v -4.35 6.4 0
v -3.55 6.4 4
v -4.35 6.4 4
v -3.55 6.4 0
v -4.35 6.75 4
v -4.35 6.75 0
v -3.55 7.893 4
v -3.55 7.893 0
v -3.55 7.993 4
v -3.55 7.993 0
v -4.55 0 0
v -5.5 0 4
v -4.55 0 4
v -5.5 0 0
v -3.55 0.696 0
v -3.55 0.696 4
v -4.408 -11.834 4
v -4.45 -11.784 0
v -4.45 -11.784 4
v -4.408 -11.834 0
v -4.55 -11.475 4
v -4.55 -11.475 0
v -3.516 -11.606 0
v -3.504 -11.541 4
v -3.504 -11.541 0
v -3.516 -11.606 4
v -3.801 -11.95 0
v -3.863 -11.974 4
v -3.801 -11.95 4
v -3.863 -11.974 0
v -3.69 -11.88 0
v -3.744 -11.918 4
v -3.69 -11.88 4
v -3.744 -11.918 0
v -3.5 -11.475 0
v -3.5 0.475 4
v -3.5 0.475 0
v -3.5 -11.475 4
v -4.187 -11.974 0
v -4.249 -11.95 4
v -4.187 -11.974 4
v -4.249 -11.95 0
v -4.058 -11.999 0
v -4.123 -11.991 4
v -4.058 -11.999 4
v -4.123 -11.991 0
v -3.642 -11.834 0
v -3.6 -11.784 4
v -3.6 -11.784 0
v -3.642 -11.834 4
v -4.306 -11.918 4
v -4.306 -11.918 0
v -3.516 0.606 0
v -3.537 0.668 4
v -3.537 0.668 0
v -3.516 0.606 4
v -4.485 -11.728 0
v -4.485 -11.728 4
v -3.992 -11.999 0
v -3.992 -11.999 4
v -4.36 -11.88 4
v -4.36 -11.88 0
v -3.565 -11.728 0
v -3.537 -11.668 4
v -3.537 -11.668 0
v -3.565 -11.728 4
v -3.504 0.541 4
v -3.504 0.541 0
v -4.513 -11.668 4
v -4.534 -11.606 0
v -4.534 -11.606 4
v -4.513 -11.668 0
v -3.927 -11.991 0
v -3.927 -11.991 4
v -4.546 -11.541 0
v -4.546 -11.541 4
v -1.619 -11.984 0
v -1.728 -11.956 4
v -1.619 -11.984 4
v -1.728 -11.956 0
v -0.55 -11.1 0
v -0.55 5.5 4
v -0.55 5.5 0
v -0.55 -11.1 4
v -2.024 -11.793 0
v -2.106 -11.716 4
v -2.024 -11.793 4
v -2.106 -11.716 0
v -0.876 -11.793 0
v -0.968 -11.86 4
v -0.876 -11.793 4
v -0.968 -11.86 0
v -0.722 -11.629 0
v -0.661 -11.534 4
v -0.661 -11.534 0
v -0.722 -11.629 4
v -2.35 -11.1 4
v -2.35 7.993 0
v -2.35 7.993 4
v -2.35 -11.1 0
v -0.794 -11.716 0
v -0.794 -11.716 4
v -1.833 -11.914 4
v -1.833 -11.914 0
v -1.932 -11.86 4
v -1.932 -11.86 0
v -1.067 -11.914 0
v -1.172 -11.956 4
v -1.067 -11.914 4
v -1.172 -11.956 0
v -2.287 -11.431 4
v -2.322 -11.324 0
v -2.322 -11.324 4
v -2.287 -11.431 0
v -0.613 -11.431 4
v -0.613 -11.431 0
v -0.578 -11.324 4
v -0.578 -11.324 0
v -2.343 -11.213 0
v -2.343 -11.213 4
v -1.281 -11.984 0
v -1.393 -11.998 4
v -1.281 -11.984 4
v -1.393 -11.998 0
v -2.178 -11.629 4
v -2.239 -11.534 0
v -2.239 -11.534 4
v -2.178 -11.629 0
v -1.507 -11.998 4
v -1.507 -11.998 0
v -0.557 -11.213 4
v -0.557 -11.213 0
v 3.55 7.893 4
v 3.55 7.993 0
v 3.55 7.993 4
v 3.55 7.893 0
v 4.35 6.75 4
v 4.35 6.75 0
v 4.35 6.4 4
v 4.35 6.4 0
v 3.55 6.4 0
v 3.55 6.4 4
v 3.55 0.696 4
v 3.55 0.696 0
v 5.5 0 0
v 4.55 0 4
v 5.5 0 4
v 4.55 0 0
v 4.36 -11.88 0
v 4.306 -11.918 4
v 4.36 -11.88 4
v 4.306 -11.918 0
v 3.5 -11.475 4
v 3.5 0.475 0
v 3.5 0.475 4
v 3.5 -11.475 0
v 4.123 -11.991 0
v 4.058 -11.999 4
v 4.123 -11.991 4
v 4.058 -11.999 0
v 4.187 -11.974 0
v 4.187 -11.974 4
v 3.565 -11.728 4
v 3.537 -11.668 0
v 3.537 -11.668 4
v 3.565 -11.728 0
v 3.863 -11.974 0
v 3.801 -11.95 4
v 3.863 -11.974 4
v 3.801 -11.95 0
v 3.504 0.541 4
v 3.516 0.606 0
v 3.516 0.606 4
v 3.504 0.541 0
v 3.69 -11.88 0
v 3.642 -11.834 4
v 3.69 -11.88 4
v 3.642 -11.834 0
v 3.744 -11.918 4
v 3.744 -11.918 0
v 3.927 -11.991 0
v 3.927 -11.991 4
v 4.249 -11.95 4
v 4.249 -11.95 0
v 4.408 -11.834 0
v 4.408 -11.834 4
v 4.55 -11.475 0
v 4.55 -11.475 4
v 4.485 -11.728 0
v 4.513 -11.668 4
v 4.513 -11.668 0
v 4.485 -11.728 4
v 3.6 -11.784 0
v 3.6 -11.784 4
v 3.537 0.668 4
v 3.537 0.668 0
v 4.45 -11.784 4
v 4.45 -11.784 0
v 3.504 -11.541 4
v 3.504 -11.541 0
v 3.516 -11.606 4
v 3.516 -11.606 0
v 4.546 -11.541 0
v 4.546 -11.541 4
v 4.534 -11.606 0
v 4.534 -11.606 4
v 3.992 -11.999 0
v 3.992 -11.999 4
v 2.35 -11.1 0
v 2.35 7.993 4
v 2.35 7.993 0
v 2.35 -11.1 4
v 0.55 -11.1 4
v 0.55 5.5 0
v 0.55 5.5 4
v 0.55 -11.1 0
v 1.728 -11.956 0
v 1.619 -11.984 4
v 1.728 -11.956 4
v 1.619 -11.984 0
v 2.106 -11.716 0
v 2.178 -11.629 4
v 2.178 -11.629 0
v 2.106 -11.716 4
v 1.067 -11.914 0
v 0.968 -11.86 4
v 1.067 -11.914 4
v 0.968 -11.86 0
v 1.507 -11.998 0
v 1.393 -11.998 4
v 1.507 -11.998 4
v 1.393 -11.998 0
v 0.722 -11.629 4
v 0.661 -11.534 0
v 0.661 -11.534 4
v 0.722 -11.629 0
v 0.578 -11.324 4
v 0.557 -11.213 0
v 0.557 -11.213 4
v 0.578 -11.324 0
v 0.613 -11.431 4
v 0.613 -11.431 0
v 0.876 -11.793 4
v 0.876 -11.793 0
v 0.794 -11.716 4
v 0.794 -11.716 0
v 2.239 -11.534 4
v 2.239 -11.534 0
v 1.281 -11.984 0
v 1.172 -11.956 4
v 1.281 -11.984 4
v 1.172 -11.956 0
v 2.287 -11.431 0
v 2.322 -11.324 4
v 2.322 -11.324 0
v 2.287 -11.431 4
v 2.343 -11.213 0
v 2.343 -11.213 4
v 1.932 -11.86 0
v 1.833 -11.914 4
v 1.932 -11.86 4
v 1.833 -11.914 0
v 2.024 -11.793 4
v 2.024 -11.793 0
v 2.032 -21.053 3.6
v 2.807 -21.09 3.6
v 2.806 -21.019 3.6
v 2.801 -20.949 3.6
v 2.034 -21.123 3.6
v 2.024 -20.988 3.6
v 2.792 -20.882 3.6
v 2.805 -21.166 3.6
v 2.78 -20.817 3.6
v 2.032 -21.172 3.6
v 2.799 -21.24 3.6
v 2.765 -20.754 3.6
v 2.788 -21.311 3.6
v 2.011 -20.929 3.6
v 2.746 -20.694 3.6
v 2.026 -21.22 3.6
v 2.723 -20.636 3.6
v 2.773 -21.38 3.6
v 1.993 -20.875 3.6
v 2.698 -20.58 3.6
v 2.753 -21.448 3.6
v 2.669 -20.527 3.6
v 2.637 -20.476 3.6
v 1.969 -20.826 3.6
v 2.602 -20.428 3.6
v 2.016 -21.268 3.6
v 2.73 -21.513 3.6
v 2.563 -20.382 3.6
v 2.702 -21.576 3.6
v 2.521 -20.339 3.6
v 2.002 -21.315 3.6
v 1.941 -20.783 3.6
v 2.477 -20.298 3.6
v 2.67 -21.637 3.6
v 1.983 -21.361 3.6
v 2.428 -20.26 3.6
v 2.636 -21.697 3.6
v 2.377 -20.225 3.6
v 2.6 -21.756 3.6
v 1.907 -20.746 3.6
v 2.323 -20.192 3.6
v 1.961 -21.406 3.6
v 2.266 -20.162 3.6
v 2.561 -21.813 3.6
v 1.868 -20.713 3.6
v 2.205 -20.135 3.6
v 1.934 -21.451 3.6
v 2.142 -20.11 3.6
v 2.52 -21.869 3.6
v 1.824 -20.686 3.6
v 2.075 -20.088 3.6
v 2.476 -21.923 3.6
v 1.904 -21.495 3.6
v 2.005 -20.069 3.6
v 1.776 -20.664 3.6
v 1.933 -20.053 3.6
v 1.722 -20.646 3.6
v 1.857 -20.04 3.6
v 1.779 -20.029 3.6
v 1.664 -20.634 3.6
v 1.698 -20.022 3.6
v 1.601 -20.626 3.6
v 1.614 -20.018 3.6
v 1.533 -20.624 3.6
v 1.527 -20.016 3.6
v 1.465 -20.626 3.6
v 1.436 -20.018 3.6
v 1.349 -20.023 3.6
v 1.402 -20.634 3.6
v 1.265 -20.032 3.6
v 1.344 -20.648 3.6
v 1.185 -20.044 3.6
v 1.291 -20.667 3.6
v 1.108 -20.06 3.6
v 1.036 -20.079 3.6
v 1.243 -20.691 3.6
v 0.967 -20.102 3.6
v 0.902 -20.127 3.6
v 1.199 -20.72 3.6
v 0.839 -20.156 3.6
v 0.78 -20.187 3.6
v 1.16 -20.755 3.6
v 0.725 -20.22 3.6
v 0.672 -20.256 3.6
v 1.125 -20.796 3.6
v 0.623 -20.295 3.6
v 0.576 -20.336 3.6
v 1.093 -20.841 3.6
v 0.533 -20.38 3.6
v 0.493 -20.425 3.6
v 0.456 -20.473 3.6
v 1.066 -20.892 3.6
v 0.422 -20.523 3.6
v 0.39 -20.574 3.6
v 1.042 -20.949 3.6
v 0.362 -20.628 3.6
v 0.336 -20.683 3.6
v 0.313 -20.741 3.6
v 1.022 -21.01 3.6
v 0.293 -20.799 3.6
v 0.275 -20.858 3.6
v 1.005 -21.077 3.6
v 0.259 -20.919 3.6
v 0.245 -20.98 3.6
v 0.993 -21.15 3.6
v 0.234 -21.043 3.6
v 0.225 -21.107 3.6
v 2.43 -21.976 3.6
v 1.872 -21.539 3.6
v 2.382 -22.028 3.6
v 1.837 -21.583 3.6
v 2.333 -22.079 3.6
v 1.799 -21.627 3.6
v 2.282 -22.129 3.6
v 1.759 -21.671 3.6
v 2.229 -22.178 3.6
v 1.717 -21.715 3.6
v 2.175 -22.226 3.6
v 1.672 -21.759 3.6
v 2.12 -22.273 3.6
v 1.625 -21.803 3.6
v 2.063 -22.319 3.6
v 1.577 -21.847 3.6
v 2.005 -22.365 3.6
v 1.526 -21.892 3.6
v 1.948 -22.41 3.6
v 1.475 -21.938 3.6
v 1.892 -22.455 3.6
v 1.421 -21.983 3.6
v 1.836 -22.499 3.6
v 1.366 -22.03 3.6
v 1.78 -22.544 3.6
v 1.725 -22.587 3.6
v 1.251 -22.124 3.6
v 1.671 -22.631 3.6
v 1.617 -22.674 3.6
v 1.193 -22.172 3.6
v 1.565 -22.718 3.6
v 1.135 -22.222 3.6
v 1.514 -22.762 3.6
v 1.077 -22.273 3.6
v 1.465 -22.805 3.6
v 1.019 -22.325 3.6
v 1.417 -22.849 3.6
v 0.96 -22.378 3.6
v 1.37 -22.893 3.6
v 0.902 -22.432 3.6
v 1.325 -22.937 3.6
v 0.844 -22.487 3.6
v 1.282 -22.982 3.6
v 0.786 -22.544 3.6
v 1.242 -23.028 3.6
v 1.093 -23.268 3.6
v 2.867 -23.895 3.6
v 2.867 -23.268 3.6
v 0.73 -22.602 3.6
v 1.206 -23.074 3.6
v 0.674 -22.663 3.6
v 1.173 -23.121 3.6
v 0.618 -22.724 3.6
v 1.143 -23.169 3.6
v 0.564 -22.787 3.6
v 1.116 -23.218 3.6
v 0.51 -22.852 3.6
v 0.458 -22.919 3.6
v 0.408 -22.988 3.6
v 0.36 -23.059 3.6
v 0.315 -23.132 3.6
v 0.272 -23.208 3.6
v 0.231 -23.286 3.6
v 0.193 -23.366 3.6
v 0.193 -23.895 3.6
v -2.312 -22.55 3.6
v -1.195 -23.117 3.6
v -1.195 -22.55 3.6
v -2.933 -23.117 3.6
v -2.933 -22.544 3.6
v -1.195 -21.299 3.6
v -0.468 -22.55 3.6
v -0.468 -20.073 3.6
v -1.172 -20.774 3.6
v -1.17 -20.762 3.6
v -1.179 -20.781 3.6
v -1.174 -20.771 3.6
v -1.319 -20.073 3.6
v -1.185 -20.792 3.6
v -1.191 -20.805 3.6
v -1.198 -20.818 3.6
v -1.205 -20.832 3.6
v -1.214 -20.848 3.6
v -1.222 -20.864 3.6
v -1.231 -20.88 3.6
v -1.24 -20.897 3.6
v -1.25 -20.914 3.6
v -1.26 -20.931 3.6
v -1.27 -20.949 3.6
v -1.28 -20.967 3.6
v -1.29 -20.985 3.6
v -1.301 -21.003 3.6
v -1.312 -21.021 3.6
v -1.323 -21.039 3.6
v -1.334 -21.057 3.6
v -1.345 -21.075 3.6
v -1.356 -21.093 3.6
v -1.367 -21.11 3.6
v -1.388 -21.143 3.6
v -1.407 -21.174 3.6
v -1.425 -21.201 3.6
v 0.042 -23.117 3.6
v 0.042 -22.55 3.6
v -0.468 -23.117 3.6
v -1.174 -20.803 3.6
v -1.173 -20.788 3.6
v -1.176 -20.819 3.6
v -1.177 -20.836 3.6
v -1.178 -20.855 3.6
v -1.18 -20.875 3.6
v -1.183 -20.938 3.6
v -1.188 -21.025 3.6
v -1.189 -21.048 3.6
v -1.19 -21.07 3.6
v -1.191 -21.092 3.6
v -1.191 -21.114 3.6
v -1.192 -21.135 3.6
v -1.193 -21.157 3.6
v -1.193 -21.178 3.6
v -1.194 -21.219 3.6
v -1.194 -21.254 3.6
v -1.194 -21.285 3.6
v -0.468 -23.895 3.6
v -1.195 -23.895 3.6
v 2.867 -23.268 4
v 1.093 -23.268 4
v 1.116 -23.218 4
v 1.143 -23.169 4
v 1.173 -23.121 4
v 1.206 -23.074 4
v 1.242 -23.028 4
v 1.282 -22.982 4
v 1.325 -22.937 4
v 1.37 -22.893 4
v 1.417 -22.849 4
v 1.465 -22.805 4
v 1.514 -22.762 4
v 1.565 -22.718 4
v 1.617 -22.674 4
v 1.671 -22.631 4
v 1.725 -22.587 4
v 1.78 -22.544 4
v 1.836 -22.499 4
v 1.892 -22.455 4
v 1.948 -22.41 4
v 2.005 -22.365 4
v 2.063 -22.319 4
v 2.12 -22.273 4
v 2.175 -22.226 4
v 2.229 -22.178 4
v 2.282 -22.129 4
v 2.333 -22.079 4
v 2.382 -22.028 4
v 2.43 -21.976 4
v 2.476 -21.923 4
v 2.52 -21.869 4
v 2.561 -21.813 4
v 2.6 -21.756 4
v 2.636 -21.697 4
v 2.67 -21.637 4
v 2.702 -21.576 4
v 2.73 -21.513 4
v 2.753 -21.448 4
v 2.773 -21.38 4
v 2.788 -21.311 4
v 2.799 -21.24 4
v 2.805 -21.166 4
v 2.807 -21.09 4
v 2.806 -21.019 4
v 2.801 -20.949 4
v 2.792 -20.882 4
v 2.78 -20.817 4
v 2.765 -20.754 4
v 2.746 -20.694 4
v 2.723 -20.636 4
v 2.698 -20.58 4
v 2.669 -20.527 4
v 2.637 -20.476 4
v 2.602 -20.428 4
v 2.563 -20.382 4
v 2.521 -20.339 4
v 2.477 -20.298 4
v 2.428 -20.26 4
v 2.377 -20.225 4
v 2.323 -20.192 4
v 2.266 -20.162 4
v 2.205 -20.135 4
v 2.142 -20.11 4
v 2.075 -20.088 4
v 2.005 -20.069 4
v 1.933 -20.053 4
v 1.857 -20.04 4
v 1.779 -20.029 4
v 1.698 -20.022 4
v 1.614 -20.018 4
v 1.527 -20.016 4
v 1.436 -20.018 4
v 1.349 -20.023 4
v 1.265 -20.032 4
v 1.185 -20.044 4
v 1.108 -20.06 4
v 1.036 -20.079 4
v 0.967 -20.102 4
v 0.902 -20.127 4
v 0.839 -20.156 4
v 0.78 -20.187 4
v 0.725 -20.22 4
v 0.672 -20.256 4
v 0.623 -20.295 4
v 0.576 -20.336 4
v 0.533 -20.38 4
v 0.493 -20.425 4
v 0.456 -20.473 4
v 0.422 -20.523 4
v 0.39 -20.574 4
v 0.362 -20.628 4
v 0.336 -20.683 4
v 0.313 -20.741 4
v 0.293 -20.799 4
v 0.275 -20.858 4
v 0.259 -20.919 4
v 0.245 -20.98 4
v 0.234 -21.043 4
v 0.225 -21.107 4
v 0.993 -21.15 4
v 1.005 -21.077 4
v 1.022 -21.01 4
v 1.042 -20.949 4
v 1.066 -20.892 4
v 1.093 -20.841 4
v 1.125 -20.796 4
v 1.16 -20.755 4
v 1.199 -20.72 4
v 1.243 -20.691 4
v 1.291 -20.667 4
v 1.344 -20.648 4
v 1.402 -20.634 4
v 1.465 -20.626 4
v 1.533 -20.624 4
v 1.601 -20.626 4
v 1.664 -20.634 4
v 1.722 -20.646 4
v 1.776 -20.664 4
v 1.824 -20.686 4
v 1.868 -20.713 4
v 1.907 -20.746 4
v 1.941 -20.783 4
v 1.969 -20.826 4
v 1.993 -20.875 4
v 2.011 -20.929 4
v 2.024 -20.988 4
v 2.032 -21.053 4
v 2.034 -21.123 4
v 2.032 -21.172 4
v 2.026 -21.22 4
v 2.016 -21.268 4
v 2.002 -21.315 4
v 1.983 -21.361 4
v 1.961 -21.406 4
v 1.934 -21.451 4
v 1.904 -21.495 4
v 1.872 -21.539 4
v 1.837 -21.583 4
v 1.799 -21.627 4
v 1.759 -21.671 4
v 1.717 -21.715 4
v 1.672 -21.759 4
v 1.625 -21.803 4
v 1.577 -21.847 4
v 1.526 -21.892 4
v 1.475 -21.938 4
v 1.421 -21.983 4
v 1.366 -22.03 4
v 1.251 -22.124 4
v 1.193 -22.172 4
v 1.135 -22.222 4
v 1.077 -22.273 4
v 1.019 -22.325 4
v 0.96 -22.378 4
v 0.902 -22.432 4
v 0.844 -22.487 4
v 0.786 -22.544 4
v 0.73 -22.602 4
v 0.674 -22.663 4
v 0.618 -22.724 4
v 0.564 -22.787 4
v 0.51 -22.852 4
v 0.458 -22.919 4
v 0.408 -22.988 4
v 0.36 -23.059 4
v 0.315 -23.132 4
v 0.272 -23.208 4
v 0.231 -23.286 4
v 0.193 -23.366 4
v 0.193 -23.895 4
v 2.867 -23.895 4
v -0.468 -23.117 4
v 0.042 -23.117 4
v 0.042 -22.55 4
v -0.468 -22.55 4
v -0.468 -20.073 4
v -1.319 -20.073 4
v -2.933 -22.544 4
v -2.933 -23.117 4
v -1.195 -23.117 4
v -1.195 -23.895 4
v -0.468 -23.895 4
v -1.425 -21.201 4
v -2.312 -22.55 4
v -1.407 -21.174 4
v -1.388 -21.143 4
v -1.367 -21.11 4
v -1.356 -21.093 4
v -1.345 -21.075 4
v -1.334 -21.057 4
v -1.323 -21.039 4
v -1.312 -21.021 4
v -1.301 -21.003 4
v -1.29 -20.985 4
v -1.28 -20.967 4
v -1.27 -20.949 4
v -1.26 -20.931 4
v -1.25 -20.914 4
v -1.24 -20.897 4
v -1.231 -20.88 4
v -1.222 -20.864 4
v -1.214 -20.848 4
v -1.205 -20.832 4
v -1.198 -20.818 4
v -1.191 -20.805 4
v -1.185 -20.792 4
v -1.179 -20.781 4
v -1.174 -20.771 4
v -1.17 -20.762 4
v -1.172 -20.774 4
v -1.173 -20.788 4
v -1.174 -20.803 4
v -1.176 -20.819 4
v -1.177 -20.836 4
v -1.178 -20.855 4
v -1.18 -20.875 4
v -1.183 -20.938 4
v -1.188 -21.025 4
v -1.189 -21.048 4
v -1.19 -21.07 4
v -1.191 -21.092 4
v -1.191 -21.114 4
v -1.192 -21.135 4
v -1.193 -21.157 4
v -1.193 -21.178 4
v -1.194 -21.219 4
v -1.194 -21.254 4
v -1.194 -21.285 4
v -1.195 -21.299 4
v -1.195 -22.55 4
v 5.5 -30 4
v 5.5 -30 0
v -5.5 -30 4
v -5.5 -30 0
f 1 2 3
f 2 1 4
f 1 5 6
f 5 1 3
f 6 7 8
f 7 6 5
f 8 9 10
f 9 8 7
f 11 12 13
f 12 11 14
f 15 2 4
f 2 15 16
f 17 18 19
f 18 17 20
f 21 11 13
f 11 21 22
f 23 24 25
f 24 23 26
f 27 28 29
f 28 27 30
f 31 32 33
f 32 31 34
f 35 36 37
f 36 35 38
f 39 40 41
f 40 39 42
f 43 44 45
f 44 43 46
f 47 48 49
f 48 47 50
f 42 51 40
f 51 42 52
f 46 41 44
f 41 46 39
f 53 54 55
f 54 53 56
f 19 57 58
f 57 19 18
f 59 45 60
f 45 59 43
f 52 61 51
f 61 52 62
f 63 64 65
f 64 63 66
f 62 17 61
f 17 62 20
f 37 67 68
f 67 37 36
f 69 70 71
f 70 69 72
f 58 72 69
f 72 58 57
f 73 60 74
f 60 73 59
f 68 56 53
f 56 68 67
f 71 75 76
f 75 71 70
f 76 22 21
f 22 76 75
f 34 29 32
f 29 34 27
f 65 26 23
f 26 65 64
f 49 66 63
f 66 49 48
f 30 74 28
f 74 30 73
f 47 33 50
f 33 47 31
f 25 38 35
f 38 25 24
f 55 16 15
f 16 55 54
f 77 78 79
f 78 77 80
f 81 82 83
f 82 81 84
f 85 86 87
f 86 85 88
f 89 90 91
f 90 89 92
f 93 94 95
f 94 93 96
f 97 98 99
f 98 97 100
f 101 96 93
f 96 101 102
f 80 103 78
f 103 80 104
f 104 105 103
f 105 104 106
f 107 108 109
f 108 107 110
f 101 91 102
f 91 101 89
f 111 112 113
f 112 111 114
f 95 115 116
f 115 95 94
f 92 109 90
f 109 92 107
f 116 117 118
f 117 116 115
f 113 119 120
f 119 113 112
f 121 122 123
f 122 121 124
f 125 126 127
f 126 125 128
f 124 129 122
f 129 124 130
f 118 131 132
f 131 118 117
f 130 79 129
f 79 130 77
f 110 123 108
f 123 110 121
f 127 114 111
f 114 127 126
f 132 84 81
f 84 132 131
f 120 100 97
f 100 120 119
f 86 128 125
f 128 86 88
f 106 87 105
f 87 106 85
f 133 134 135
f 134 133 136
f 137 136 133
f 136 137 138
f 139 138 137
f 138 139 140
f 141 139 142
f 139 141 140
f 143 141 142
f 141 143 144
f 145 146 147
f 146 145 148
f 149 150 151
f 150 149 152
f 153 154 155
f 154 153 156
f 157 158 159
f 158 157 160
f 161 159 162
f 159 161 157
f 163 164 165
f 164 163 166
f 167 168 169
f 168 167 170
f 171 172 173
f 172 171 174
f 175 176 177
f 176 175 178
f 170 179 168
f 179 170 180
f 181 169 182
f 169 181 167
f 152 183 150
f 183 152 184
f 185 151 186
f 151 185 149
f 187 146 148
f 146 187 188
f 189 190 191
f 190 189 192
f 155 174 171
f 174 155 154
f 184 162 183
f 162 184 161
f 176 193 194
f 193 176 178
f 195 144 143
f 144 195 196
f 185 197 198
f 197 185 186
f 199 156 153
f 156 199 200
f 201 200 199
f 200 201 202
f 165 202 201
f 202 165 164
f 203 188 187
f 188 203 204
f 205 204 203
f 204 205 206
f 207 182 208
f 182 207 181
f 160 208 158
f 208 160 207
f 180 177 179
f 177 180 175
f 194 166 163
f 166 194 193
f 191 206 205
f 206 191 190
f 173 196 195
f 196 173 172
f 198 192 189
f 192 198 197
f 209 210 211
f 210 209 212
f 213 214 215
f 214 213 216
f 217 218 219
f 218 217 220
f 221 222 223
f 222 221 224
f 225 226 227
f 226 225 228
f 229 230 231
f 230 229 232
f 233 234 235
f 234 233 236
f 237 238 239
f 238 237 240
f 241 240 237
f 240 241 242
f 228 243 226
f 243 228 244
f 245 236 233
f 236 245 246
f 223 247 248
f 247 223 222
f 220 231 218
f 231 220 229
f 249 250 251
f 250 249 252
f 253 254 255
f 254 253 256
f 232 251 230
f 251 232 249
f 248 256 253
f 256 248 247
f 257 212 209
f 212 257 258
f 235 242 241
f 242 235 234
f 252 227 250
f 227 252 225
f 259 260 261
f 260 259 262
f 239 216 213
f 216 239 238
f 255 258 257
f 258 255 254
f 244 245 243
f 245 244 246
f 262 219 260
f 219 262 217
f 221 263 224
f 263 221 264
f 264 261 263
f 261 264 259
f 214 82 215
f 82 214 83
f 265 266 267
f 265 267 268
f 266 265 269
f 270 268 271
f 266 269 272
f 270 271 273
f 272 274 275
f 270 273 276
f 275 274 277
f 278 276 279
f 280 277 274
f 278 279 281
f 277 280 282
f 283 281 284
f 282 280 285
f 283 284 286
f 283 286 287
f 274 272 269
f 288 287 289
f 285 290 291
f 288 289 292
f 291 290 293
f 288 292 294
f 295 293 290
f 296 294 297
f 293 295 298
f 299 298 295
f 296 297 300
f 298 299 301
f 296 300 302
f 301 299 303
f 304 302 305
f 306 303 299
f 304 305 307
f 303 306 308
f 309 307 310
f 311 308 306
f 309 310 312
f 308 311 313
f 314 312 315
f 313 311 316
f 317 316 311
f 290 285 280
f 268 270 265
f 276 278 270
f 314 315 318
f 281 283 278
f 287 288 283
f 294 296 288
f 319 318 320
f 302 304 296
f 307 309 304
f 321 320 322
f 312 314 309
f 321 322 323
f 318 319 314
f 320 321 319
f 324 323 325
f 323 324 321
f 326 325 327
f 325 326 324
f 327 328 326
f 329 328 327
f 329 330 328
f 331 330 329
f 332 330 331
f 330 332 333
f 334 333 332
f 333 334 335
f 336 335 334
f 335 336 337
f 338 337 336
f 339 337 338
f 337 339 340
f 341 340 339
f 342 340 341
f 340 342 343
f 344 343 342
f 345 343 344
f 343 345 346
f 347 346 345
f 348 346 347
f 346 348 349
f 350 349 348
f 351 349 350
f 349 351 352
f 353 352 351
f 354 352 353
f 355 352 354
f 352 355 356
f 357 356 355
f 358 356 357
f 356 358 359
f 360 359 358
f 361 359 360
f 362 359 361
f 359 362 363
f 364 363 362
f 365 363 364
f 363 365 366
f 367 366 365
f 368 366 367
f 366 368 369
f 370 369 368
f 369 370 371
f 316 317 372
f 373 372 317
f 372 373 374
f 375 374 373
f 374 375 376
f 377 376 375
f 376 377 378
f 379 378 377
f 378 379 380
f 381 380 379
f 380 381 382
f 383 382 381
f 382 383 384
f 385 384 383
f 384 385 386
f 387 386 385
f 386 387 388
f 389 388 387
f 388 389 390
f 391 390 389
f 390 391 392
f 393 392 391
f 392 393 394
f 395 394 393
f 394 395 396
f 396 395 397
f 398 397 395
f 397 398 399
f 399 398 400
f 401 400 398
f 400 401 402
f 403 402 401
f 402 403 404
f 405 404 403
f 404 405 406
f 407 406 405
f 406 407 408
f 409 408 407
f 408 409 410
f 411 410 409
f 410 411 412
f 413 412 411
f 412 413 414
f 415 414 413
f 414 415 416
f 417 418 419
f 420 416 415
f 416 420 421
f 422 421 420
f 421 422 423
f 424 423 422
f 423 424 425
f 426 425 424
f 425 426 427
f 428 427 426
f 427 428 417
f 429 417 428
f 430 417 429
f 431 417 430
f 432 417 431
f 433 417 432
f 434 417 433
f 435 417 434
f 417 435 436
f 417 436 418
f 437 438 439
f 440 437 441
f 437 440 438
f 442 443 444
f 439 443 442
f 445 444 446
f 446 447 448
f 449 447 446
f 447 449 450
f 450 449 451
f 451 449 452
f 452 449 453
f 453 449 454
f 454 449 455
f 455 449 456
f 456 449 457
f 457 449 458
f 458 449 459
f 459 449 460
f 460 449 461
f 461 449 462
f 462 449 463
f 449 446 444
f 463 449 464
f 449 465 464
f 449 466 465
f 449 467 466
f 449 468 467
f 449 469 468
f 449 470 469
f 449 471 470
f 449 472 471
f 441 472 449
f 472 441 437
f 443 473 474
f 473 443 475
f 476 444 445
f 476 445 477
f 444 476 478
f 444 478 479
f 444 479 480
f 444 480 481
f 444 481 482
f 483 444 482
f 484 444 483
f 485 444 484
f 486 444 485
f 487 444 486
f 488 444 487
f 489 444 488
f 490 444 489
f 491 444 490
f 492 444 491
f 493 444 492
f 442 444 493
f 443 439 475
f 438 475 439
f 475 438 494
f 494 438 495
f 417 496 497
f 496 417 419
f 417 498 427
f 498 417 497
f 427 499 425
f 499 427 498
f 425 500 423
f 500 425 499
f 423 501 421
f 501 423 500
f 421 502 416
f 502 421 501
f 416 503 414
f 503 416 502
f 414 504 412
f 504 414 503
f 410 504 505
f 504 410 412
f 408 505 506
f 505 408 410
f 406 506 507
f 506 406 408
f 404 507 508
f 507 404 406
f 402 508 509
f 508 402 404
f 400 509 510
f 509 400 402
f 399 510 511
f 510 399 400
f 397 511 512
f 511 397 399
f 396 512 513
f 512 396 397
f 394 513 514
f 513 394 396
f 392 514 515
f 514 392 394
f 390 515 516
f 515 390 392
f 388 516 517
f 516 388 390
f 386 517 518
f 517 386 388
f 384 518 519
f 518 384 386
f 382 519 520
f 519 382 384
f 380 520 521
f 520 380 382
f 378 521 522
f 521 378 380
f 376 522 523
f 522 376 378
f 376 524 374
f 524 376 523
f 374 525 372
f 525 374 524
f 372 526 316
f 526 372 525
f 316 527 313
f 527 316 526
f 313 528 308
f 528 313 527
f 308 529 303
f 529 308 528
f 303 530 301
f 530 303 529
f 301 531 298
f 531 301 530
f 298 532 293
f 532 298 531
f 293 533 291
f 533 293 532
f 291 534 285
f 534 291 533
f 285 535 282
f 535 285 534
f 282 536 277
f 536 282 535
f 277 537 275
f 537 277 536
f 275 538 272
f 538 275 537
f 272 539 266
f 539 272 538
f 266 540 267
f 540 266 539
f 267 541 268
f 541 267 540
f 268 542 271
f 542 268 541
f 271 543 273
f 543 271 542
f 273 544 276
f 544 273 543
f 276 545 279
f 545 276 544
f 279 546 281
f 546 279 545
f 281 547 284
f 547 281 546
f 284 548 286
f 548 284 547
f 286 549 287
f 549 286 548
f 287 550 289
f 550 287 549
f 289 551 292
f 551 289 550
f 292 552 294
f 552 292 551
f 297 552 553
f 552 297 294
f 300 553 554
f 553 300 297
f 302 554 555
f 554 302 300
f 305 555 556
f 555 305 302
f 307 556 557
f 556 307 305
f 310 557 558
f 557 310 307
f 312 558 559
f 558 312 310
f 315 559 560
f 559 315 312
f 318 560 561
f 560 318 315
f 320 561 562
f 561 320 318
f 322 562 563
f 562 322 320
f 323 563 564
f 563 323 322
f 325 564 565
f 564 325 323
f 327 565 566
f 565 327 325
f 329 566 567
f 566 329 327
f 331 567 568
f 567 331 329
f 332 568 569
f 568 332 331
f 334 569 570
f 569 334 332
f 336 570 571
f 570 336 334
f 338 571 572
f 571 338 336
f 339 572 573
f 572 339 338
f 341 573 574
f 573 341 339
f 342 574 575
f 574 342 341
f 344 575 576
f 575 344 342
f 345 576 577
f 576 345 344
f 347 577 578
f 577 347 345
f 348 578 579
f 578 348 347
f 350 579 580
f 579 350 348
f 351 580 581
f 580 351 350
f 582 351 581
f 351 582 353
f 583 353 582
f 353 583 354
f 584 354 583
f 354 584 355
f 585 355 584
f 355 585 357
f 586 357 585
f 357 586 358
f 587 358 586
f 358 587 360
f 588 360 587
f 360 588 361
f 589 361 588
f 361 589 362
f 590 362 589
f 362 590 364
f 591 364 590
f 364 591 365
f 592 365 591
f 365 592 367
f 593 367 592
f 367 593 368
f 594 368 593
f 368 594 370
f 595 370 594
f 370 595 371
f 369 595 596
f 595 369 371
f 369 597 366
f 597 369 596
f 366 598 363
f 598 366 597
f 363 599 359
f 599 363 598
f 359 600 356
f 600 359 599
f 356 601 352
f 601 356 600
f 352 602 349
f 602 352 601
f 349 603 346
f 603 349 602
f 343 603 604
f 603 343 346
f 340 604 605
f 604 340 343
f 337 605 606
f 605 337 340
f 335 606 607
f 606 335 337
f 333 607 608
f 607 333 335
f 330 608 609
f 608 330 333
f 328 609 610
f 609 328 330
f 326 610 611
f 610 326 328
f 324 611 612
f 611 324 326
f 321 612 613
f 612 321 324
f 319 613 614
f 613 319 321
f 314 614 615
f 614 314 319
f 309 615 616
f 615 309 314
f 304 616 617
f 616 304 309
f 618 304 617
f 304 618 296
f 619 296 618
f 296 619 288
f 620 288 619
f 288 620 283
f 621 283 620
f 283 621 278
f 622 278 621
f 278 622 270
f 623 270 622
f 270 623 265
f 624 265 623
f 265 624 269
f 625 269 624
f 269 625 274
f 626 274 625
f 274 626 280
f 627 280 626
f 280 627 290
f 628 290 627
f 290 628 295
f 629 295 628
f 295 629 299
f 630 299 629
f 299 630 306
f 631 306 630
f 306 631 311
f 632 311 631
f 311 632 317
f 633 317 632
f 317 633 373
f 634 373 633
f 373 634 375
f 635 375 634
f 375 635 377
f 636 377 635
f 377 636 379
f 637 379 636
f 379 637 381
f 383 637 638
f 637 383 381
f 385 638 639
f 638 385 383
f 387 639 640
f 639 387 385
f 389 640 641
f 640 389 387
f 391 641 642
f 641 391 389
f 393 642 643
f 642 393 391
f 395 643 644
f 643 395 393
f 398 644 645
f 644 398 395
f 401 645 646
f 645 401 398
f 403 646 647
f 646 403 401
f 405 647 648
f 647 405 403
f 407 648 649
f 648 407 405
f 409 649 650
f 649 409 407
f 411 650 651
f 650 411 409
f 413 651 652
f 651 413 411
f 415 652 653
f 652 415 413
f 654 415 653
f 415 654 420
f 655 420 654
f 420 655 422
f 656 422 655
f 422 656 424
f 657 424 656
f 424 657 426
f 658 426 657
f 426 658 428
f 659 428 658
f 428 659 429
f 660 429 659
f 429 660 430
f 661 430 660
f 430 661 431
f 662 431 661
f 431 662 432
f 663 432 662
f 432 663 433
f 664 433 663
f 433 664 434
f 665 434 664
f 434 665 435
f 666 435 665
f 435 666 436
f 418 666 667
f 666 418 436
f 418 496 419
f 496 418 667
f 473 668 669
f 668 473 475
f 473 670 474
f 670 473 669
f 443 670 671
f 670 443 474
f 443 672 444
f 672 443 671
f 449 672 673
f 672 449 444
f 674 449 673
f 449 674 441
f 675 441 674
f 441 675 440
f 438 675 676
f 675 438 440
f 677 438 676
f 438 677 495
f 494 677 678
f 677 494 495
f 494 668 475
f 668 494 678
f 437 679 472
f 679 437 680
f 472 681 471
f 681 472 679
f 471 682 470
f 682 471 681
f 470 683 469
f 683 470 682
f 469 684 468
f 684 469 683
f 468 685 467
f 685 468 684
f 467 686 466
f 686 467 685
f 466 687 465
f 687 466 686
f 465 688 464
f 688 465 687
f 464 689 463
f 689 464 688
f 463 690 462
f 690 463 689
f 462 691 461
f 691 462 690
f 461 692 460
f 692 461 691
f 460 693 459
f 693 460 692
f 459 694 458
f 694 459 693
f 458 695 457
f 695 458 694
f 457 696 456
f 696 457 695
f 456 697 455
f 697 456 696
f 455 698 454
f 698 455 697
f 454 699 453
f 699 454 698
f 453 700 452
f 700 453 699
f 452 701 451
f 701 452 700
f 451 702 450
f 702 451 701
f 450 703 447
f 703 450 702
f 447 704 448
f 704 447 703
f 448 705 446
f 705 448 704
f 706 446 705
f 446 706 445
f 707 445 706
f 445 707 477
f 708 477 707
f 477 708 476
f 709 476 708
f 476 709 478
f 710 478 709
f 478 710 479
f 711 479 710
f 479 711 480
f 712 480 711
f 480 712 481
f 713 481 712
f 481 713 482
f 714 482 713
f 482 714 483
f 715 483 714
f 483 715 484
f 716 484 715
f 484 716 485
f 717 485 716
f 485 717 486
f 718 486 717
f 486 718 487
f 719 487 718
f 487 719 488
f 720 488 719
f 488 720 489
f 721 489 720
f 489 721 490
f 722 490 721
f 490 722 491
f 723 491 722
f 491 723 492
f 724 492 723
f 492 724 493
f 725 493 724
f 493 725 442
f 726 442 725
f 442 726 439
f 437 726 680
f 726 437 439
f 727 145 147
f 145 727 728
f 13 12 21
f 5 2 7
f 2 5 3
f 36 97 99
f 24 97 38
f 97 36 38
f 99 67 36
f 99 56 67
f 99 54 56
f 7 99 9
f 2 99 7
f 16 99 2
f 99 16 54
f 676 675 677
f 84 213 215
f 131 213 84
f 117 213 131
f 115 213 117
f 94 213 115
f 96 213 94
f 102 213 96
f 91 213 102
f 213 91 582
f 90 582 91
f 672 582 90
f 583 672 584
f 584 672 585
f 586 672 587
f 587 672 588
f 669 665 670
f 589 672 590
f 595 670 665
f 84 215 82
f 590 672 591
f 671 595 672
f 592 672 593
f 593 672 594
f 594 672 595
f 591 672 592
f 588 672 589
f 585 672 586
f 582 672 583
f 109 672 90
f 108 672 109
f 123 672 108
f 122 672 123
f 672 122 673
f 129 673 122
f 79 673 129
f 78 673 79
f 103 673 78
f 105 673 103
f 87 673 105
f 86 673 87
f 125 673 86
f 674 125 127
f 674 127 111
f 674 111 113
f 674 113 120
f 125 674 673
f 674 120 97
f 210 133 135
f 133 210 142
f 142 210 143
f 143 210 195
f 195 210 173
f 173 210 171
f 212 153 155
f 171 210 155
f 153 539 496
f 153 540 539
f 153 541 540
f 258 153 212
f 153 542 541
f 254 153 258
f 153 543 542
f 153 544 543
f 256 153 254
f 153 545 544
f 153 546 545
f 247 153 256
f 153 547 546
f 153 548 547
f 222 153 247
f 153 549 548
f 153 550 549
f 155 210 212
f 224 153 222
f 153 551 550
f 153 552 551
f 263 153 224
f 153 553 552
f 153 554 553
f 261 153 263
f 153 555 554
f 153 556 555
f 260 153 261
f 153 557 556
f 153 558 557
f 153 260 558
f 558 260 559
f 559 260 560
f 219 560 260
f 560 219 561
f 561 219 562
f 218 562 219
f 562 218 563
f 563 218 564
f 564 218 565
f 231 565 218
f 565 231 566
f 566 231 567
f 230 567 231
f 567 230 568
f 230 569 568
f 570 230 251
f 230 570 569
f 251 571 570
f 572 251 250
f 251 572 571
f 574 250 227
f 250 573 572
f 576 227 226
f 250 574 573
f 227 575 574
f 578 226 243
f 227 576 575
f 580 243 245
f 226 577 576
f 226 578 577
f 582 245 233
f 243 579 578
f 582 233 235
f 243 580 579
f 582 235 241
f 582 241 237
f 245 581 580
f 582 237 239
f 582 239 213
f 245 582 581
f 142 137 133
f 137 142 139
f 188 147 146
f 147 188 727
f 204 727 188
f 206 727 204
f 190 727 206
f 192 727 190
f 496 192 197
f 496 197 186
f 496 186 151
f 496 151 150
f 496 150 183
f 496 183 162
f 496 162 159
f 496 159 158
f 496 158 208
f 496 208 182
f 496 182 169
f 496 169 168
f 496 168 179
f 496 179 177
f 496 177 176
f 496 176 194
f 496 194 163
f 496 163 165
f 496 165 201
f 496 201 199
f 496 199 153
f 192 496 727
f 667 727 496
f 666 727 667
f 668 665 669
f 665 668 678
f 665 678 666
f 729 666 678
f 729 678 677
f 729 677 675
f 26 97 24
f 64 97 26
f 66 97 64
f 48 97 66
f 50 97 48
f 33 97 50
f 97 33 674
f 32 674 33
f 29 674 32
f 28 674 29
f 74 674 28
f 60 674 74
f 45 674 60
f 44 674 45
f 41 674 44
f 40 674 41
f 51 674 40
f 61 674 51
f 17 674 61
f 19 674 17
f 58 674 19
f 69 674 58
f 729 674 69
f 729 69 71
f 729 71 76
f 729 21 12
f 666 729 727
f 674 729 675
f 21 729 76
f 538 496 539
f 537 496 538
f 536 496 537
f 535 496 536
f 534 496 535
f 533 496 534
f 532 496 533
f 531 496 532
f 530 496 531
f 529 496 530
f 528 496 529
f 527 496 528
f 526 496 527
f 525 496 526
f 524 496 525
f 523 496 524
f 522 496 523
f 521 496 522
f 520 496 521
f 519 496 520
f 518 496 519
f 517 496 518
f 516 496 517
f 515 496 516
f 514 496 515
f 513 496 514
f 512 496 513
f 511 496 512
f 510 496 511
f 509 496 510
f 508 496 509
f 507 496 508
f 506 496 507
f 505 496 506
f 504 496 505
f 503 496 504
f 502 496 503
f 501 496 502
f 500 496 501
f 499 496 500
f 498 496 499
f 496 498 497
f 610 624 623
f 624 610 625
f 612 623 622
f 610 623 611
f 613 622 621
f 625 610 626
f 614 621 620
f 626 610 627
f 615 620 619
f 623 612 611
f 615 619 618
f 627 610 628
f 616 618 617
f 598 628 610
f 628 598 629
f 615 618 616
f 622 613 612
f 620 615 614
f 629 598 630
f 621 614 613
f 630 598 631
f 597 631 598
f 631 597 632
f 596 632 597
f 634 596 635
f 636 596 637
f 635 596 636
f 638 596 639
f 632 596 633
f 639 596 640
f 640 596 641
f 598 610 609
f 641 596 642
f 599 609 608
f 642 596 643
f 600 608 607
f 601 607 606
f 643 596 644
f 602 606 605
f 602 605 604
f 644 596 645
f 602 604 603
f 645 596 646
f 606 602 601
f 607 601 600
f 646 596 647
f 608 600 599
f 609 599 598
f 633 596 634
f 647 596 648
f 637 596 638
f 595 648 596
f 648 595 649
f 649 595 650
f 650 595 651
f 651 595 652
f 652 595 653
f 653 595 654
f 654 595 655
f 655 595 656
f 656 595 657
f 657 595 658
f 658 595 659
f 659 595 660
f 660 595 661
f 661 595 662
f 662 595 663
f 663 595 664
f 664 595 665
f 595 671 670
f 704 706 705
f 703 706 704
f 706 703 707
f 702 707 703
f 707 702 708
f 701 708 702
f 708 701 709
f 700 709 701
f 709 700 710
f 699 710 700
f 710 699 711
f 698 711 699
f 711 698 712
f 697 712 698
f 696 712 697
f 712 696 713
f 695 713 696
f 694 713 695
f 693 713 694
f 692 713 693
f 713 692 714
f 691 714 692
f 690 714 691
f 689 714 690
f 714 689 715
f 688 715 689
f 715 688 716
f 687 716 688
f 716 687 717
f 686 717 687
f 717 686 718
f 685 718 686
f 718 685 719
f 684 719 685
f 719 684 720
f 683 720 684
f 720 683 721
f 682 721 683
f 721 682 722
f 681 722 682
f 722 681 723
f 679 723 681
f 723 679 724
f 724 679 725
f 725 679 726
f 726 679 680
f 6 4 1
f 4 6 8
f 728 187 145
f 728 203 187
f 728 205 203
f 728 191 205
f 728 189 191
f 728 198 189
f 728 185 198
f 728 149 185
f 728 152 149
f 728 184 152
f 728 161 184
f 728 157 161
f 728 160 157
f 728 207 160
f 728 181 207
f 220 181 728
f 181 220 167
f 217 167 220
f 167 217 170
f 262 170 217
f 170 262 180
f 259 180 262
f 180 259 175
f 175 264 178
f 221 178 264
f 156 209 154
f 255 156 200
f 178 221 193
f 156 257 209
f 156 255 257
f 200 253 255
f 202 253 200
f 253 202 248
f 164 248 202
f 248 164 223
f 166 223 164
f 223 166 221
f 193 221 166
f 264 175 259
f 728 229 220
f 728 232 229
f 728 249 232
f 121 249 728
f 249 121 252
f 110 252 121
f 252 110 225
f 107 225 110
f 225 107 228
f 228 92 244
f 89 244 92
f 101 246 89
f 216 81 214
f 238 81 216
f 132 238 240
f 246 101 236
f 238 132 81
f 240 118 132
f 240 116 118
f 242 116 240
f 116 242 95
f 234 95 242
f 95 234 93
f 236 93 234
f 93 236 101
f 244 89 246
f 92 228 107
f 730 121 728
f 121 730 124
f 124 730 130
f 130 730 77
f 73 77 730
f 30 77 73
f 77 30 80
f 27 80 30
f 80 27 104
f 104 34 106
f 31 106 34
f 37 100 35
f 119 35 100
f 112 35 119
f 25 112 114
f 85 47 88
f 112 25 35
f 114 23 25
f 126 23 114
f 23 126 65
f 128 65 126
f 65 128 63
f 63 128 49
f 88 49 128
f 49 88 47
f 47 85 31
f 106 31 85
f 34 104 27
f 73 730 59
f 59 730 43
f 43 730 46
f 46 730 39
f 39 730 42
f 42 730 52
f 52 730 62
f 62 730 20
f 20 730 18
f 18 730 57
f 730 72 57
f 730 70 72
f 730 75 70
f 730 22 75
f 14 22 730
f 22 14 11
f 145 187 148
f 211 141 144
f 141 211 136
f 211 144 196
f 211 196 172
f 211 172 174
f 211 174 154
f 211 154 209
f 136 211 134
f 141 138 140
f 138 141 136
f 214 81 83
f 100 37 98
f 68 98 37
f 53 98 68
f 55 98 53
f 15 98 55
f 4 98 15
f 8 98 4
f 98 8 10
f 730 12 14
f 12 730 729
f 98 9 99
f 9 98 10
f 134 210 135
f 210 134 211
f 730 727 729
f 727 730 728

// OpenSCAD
$fn = 50;

difference() {
	union() {
		translate(v = [0, 0, 0]) {
			rotate(a = [0, 0, 0]) {
				difference() {
					union() {
						translate(v = [-5.5, -30.0, 0]) {
							cube(size = [11.0, 37.99251840539369, 4.0]);
						}
					}
					union() {
						translate(v = [0, 0, -0.1]) {
							linear_extrude(height = 4.2) {
								polygon(points = [[-3.55, 0], [-3.55, 6.4], [-4.35, 6.4], [-4.35, 6.75], [-3.55, 7.892518405393692], [-3.55, 8.992518405393692], [-5.7, 8.992518405393692], [-5.7, 0]]);
							}
						}
						translate(v = [-4.0249999999999995, -5.5, -0.1]) {
							hull() {
								translate(v = [-0.0, 5.975, 0]) {
									cylinder(h = 4.2, r = 0.525);
								}
								translate(v = [0.0, 5.975, 0]) {
									cylinder(h = 4.2, r = 0.525);
								}
								translate(v = [-0.0, -5.975, 0]) {
									cylinder(h = 4.2, r = 0.525);
								}
								translate(v = [0.0, -5.975, 0]) {
									cylinder(h = 4.2, r = 0.525);
								}
							}
						}
						translate(v = [-1.4499999999999997, -1.5037407973031538, -0.1]) {
							hull() {
								translate(v = [-0.0, 9.596259202696846, 0]) {
									cylinder(h = 4.2, r = 0.8999999999999998);
								}
								translate(v = [0.0, 9.596259202696846, 0]) {
									cylinder(h = 4.2, r = 0.8999999999999998);
								}
								translate(v = [-0.0, -9.596259202696846, 0]) {
									cylinder(h = 4.2, r = 0.8999999999999998);
								}
								translate(v = [0.0, -9.596259202696846, 0]) {
									cylinder(h = 4.2, r = 0.8999999999999998);
								}
							}
						}
						translate(v = [0, 0, -0.1]) {
							linear_extrude(height = 4.2) {
								polygon(points = [[3.55, 0], [3.55, 6.4], [4.35, 6.4], [4.35, 6.75], [3.55, 7.892518405393692], [3.55, 8.992518405393692], [5.7, 8.992518405393692], [5.7, 0]]);
							}
						}
						translate(v = [4.0249999999999995, -5.5, -0.1]) {
							hull() {
								translate(v = [-0.0, 5.975, 0]) {
									cylinder(h = 4.2, r = 0.525);
								}
								translate(v = [0.0, 5.975, 0]) {
									cylinder(h = 4.2, r = 0.525);
								}
								translate(v = [-0.0, -5.975, 0]) {
									cylinder(h = 4.2, r = 0.525);
								}
								translate(v = [0.0, -5.975, 0]) {
									cylinder(h = 4.2, r = 0.525);
								}
							}
						}
						translate(v = [1.4499999999999997, -1.5037407973031538, -0.1]) {
							hull() {
								translate(v = [-0.0, 9.596259202696846, 0]) {
									cylinder(h = 4.2, r = 0.8999999999999998);
								}
								translate(v = [0.0, 9.596259202696846, 0]) {
									cylinder(h = 4.2, r = 0.8999999999999998);
								}
								translate(v = [-0.0, -9.596259202696846, 0]) {
									cylinder(h = 4.2, r = 0.8999999999999998);
								}
								translate(v = [0.0, -9.596259202696846, 0]) {
									cylinder(h = 4.2, r = 0.8999999999999998);
								}
							}
						}
						translate(v = [-0.6000000000000001, 5.5, -0.1]) {
							cube(size = [1.2000000000000002, 3.4925184053936915, 4.2]);
						}
						translate(v = [0, -22, 3.6]) {
							linear_extrude(height = 0.5) {
								text(font = "Arial:style=Bold", halign = "center", size = 4.0, text = "42", valign = "center");
							}
						}
					}
				}
			}
		}
	}
	union();
}
